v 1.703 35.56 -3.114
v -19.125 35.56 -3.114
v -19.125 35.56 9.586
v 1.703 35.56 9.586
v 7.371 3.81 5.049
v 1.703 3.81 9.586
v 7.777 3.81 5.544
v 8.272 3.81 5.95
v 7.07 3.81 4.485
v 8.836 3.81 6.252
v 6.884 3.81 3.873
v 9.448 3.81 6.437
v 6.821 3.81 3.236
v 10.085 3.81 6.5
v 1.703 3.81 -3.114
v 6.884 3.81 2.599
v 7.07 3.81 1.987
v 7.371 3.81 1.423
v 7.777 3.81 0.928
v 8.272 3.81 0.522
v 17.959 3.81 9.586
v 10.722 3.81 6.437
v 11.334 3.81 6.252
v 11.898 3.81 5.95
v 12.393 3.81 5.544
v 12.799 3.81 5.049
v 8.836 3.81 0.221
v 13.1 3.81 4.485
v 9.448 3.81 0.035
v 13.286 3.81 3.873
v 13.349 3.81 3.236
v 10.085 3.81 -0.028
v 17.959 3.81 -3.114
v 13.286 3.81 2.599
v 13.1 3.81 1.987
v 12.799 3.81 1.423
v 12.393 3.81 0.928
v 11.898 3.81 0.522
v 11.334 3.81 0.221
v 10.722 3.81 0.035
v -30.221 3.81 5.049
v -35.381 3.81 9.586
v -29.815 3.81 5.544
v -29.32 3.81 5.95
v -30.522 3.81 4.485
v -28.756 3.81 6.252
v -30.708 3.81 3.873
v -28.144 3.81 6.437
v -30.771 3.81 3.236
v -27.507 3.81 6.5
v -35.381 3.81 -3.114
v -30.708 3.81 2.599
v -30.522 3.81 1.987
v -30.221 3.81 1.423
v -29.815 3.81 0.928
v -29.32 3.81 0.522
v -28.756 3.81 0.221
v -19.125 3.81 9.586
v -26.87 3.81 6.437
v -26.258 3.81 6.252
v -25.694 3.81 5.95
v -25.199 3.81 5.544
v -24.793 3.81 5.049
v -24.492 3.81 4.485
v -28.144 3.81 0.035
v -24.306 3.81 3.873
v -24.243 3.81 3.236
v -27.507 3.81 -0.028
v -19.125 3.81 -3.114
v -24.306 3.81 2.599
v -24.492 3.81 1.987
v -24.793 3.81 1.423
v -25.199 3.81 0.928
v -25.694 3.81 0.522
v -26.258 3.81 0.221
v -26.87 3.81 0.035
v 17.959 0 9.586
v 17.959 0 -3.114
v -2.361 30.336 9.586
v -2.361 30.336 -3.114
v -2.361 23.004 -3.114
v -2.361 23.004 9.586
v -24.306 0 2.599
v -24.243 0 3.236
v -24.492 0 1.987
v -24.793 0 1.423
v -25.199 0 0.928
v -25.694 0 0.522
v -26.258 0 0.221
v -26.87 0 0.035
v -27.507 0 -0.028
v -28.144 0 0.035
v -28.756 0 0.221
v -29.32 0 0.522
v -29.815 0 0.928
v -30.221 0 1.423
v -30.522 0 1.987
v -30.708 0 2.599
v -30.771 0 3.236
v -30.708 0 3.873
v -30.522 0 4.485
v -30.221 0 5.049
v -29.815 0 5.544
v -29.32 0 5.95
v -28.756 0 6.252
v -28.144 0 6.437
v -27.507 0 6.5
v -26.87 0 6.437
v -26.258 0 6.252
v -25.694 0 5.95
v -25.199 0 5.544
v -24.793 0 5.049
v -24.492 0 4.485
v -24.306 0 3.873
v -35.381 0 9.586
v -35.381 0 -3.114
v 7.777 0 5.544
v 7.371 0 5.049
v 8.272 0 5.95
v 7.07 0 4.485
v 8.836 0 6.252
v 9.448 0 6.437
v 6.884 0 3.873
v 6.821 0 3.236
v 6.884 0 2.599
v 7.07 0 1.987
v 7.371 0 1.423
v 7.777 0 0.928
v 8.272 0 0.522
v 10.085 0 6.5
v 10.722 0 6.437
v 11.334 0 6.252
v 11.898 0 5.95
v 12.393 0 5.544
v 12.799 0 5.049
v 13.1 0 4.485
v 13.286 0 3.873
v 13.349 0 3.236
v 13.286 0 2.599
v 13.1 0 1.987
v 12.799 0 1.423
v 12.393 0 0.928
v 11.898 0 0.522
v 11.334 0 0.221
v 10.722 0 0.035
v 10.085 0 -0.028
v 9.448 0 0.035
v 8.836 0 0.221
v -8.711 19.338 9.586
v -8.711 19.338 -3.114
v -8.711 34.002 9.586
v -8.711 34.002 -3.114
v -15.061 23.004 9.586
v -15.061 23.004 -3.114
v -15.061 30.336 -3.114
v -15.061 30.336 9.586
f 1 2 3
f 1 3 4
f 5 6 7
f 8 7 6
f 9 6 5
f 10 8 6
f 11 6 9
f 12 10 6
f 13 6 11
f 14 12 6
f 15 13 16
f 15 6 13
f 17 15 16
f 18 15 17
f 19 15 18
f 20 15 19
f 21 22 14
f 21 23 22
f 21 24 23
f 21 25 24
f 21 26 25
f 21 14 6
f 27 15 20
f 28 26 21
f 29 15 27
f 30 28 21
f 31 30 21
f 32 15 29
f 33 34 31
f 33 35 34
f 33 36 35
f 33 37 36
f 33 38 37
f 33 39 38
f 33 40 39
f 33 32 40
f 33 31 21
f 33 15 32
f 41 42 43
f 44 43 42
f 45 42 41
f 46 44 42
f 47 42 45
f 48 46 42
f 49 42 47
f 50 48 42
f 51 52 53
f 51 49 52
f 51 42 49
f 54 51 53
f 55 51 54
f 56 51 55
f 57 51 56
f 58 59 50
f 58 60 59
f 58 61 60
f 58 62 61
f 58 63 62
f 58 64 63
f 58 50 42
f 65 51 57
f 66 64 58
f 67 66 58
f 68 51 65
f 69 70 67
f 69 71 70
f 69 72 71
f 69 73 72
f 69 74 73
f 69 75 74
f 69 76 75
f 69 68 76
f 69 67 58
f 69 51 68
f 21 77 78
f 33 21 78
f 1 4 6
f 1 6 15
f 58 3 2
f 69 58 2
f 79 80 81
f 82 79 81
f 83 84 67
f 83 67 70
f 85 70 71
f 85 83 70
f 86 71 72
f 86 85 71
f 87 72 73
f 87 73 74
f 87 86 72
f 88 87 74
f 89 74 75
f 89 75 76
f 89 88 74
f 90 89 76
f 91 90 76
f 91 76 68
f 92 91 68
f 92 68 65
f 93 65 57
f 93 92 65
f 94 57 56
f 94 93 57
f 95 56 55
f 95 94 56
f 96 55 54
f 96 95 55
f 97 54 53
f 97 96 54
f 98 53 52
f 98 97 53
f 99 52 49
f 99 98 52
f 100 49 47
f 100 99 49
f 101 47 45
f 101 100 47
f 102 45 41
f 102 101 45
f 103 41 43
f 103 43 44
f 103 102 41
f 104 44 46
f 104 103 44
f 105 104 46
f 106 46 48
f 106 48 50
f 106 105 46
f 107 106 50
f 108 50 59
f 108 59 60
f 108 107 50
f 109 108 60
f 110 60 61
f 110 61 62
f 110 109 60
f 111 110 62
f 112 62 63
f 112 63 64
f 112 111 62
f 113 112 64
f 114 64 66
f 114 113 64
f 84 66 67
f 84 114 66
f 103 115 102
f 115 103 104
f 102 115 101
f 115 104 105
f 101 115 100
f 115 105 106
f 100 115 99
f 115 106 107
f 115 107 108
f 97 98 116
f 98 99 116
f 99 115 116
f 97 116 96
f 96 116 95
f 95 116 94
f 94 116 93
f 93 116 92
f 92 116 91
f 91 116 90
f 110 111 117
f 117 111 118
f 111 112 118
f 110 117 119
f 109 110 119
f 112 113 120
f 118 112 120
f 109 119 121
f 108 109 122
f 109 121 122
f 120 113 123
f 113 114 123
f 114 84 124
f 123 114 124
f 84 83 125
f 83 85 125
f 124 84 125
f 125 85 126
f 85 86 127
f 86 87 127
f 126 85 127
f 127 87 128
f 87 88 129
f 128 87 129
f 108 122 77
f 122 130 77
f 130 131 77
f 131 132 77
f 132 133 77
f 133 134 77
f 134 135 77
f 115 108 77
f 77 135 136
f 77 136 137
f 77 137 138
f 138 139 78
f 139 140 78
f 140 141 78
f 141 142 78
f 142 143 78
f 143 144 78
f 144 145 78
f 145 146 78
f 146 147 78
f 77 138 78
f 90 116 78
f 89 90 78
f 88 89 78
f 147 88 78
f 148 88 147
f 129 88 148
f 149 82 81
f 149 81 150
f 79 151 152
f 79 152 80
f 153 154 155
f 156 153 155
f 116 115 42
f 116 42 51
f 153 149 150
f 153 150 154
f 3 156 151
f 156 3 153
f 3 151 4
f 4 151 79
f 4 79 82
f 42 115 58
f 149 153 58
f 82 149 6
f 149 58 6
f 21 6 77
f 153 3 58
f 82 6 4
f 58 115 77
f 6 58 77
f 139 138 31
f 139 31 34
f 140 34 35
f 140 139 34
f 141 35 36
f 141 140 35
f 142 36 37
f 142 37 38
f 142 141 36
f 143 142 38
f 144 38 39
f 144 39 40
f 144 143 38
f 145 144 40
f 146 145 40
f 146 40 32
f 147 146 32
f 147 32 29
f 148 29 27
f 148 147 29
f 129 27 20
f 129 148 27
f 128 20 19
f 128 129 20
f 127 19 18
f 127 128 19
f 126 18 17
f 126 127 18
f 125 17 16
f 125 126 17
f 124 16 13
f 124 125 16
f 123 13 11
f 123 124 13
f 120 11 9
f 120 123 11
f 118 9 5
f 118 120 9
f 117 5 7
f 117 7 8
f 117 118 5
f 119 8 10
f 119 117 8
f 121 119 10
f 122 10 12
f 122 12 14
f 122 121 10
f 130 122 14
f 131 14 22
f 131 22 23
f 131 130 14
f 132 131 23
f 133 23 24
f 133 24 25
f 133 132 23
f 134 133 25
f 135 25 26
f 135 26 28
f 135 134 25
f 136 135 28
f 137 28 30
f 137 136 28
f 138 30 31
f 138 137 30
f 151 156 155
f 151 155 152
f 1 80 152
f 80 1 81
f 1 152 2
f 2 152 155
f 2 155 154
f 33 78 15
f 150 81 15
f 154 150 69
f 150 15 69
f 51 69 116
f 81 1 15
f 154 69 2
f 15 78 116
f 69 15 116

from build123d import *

# Parameters (mm, degrees)
SKETCH1_W           = 15.494
SKETCH1_H           = 12.7
SKETCH1_R           = 3.2639
SKETCH1_W_2         = 22.352
BOSS_EXTRUDE3_DEPTH = 3.81
SKETCH3_W           = 20.828
SKETCH3_H           = 12.7
BOSS_EXTRUDE4_DEPTH = 31.75
CUT_EXTRUDE3_REACH  = 14.7


with BuildPart() as part:
    # Sketch1 → Boss-Extrude3 (new body)
    with BuildSketch(Plane(origin=(0, 0, 0), x_dir=(1, 0, 0), z_dir=(0, 1, 0))):
        with Locations((-27.634045528, -3.236090754)):
            Rectangle(SKETCH1_W, SKETCH1_H)
        with Locations((-27.507045528, -3.236090754)):
            Circle(SKETCH1_R, mode=Mode.SUBTRACT)
        with Locations((-8.711045528, -3.236090754)):
            Rectangle(SKETCH1_W_2, SKETCH1_H)
        with Locations((10.211954472, -3.236090754)):
            Rectangle(SKETCH1_W, SKETCH1_H)
        with Locations((10.084954472, -3.236090754)):
            Circle(SKETCH1_R, mode=Mode.SUBTRACT)
    extrude(amount=BOSS_EXTRUDE3_DEPTH)

    # Sketch3 → Boss-Extrude4 (add)
    with BuildSketch(Plane(origin=(0, 3.81, 0), x_dir=(1, 0, 0), z_dir=(0, 1, 0))):
        with Locations((-8.711045528, -3.236090754)):
            Rectangle(SKETCH3_W, SKETCH3_H)
    extrude(amount=BOSS_EXTRUDE4_DEPTH)

    # Sketch5 → Cut-Extrude3 (cut, up to next)
    with BuildSketch(Plane(origin=(0, 0, -3.113909246), x_dir=(-1, 0, 0), z_dir=(0, 0, -1)), mode=Mode.PRIVATE) as cut_extrude3_sk1:
        Polygon((8.711045528, 34.002348419), (2.361045528, 30.336174209), (2.361045528, 23.003825791), (8.711045528, 19.337651581), (15.061045528, 23.003825791), (15.061045528, 30.336174209), align=None)
    cut_extrude3_tool1 = extrude(cut_extrude3_sk1.sketch, amount=-CUT_EXTRUDE3_REACH, mode=Mode.PRIVATE) & part.part
    add(cut_extrude3_tool1.solids().sort_by_distance((-8.711046, 26.67, -3.113909))[0], mode=Mode.SUBTRACT)


solid = part.part
